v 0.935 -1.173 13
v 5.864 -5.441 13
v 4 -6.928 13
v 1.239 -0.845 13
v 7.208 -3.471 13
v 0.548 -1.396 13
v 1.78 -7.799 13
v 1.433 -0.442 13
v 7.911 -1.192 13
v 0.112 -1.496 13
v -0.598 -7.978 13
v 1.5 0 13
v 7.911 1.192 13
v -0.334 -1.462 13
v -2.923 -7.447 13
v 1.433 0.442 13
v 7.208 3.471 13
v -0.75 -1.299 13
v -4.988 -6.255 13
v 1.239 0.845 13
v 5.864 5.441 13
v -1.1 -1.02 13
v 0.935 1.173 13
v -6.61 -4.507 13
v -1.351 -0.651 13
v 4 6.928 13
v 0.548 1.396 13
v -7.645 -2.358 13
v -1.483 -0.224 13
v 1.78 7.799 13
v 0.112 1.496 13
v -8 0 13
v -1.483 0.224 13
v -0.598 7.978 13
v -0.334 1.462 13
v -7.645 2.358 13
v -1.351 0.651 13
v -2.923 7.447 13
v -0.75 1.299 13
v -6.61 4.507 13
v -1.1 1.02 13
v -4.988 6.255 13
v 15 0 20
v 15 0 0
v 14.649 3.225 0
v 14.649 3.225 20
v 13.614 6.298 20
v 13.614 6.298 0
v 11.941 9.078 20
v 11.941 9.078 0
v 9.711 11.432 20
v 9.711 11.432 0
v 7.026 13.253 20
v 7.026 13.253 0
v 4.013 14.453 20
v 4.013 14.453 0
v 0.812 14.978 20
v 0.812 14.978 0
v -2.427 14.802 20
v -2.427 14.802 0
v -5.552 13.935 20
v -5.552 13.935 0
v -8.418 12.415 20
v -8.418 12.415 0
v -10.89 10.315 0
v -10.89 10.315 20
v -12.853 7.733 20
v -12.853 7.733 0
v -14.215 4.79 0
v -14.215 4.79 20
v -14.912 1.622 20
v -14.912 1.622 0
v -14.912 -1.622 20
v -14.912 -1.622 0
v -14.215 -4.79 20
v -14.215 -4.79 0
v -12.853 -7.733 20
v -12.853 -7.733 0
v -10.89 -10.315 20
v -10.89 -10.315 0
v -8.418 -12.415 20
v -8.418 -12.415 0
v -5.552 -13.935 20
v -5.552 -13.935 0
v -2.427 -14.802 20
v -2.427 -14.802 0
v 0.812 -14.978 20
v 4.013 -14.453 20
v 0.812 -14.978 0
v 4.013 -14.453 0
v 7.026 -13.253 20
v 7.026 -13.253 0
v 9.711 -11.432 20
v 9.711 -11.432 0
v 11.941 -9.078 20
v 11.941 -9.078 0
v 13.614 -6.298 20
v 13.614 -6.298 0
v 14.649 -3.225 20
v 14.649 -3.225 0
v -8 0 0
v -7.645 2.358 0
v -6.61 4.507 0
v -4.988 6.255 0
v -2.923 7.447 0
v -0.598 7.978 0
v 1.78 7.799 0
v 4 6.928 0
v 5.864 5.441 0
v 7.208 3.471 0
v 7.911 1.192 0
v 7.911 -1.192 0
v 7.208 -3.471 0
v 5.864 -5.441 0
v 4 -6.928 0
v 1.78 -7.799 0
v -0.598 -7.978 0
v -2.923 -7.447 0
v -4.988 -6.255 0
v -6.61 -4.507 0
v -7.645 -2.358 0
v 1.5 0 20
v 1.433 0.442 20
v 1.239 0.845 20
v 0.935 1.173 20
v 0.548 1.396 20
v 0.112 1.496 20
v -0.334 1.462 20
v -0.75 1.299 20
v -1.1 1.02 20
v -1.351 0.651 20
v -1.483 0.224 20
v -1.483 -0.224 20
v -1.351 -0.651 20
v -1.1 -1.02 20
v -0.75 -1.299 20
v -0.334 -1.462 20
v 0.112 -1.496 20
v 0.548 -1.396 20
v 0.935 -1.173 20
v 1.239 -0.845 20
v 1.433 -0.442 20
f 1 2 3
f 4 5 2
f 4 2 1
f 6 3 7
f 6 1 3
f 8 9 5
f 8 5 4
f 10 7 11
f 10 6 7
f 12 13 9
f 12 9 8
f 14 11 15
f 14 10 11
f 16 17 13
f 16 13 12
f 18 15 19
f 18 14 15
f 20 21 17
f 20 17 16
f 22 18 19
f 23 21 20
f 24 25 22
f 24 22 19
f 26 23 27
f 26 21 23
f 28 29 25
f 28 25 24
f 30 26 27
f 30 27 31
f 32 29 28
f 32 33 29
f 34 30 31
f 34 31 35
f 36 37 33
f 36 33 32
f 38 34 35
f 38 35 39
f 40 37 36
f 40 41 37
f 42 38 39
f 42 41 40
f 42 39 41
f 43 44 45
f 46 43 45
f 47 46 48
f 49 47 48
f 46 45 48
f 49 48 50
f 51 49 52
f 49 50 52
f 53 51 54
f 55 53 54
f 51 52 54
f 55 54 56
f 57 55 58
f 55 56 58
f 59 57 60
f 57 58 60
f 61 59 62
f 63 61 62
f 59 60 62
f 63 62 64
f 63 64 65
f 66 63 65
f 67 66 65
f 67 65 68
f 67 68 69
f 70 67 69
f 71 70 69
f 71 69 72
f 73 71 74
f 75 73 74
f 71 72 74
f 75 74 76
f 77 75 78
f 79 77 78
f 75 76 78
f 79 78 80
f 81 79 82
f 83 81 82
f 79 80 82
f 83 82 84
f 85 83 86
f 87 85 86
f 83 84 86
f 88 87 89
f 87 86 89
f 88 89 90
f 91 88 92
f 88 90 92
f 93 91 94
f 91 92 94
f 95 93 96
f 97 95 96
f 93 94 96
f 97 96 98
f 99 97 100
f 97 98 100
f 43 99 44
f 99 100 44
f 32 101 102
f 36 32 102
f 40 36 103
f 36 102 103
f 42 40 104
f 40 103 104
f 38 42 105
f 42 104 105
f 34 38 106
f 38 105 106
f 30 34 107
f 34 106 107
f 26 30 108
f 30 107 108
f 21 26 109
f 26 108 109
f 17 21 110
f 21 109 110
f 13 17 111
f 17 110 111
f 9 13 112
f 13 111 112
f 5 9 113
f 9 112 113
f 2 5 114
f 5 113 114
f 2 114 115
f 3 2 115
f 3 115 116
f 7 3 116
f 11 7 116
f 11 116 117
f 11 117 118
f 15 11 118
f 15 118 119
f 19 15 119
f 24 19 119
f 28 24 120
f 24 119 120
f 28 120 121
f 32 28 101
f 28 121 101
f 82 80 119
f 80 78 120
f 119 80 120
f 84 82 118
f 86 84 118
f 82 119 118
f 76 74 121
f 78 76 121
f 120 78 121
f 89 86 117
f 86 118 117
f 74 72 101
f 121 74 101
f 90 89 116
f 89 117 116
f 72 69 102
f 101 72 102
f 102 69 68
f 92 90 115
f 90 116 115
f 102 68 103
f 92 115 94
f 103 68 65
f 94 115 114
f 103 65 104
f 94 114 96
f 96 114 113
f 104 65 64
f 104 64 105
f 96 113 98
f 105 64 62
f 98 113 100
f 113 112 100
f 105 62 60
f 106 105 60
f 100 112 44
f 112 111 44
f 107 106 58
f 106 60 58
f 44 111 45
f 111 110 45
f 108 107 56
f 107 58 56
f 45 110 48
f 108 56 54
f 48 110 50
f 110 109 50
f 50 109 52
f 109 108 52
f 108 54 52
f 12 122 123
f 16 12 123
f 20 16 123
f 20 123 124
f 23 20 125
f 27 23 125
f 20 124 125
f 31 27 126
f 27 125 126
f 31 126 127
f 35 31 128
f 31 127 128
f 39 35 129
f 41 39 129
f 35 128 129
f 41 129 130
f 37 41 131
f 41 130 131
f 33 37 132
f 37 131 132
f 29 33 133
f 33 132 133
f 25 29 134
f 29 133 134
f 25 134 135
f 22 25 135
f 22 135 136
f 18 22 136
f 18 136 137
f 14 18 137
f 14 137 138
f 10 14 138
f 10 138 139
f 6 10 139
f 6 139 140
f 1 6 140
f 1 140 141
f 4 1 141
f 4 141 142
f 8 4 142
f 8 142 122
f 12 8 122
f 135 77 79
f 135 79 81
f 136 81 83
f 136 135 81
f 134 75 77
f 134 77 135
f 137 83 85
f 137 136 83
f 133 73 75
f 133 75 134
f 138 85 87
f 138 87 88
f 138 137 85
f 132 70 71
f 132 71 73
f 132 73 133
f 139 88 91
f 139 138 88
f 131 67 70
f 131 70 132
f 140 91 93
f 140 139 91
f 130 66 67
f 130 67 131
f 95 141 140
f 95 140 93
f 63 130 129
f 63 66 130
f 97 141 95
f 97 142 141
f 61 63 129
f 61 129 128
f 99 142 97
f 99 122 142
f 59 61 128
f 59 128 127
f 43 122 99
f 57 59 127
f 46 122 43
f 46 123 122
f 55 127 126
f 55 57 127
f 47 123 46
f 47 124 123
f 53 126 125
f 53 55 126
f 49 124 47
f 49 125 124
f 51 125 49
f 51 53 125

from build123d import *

# Parameters (mm, degrees)
CROQUIS1_R              = 15
SALIENTE_EXTRUIR1_DEPTH = 20
CROQUIS2_R              = 8
CORTAR_EXTRUIR1_DEPTH   = 13
CORTAR_EXTRUIR2_REACH   = 31.155
CROQUIS3_R              = 1.5


with BuildPart() as part:
    # Croquis1 → Saliente-Extruir1 (new body)
    with BuildSketch(Plane.XY):
        Circle(CROQUIS1_R)
    extrude(amount=SALIENTE_EXTRUIR1_DEPTH)

    # Croquis2 → Cortar-Extruir1 (cut)
    with BuildSketch(Plane(origin=(0, 0, 0), x_dir=(-1, 0, 0), z_dir=(0, 0, -1))):
        Circle(CROQUIS2_R)
    extrude(amount=-CORTAR_EXTRUIR1_DEPTH, mode=Mode.SUBTRACT)

    # Croquis3 → Cortar-Extruir2 (cut, up to next)
    with BuildSketch(Plane.XY.offset(20), mode=Mode.PRIVATE) as cortar_extruir2_sk1:
        Circle(CROQUIS3_R)
    cortar_extruir2_tool1 = extrude(cortar_extruir2_sk1.sketch, amount=-CORTAR_EXTRUIR2_REACH, mode=Mode.PRIVATE) & part.part
    add(cortar_extruir2_tool1.solids().sort_by_distance((0, 0, 20))[0], mode=Mode.SUBTRACT)


solid = part.part
